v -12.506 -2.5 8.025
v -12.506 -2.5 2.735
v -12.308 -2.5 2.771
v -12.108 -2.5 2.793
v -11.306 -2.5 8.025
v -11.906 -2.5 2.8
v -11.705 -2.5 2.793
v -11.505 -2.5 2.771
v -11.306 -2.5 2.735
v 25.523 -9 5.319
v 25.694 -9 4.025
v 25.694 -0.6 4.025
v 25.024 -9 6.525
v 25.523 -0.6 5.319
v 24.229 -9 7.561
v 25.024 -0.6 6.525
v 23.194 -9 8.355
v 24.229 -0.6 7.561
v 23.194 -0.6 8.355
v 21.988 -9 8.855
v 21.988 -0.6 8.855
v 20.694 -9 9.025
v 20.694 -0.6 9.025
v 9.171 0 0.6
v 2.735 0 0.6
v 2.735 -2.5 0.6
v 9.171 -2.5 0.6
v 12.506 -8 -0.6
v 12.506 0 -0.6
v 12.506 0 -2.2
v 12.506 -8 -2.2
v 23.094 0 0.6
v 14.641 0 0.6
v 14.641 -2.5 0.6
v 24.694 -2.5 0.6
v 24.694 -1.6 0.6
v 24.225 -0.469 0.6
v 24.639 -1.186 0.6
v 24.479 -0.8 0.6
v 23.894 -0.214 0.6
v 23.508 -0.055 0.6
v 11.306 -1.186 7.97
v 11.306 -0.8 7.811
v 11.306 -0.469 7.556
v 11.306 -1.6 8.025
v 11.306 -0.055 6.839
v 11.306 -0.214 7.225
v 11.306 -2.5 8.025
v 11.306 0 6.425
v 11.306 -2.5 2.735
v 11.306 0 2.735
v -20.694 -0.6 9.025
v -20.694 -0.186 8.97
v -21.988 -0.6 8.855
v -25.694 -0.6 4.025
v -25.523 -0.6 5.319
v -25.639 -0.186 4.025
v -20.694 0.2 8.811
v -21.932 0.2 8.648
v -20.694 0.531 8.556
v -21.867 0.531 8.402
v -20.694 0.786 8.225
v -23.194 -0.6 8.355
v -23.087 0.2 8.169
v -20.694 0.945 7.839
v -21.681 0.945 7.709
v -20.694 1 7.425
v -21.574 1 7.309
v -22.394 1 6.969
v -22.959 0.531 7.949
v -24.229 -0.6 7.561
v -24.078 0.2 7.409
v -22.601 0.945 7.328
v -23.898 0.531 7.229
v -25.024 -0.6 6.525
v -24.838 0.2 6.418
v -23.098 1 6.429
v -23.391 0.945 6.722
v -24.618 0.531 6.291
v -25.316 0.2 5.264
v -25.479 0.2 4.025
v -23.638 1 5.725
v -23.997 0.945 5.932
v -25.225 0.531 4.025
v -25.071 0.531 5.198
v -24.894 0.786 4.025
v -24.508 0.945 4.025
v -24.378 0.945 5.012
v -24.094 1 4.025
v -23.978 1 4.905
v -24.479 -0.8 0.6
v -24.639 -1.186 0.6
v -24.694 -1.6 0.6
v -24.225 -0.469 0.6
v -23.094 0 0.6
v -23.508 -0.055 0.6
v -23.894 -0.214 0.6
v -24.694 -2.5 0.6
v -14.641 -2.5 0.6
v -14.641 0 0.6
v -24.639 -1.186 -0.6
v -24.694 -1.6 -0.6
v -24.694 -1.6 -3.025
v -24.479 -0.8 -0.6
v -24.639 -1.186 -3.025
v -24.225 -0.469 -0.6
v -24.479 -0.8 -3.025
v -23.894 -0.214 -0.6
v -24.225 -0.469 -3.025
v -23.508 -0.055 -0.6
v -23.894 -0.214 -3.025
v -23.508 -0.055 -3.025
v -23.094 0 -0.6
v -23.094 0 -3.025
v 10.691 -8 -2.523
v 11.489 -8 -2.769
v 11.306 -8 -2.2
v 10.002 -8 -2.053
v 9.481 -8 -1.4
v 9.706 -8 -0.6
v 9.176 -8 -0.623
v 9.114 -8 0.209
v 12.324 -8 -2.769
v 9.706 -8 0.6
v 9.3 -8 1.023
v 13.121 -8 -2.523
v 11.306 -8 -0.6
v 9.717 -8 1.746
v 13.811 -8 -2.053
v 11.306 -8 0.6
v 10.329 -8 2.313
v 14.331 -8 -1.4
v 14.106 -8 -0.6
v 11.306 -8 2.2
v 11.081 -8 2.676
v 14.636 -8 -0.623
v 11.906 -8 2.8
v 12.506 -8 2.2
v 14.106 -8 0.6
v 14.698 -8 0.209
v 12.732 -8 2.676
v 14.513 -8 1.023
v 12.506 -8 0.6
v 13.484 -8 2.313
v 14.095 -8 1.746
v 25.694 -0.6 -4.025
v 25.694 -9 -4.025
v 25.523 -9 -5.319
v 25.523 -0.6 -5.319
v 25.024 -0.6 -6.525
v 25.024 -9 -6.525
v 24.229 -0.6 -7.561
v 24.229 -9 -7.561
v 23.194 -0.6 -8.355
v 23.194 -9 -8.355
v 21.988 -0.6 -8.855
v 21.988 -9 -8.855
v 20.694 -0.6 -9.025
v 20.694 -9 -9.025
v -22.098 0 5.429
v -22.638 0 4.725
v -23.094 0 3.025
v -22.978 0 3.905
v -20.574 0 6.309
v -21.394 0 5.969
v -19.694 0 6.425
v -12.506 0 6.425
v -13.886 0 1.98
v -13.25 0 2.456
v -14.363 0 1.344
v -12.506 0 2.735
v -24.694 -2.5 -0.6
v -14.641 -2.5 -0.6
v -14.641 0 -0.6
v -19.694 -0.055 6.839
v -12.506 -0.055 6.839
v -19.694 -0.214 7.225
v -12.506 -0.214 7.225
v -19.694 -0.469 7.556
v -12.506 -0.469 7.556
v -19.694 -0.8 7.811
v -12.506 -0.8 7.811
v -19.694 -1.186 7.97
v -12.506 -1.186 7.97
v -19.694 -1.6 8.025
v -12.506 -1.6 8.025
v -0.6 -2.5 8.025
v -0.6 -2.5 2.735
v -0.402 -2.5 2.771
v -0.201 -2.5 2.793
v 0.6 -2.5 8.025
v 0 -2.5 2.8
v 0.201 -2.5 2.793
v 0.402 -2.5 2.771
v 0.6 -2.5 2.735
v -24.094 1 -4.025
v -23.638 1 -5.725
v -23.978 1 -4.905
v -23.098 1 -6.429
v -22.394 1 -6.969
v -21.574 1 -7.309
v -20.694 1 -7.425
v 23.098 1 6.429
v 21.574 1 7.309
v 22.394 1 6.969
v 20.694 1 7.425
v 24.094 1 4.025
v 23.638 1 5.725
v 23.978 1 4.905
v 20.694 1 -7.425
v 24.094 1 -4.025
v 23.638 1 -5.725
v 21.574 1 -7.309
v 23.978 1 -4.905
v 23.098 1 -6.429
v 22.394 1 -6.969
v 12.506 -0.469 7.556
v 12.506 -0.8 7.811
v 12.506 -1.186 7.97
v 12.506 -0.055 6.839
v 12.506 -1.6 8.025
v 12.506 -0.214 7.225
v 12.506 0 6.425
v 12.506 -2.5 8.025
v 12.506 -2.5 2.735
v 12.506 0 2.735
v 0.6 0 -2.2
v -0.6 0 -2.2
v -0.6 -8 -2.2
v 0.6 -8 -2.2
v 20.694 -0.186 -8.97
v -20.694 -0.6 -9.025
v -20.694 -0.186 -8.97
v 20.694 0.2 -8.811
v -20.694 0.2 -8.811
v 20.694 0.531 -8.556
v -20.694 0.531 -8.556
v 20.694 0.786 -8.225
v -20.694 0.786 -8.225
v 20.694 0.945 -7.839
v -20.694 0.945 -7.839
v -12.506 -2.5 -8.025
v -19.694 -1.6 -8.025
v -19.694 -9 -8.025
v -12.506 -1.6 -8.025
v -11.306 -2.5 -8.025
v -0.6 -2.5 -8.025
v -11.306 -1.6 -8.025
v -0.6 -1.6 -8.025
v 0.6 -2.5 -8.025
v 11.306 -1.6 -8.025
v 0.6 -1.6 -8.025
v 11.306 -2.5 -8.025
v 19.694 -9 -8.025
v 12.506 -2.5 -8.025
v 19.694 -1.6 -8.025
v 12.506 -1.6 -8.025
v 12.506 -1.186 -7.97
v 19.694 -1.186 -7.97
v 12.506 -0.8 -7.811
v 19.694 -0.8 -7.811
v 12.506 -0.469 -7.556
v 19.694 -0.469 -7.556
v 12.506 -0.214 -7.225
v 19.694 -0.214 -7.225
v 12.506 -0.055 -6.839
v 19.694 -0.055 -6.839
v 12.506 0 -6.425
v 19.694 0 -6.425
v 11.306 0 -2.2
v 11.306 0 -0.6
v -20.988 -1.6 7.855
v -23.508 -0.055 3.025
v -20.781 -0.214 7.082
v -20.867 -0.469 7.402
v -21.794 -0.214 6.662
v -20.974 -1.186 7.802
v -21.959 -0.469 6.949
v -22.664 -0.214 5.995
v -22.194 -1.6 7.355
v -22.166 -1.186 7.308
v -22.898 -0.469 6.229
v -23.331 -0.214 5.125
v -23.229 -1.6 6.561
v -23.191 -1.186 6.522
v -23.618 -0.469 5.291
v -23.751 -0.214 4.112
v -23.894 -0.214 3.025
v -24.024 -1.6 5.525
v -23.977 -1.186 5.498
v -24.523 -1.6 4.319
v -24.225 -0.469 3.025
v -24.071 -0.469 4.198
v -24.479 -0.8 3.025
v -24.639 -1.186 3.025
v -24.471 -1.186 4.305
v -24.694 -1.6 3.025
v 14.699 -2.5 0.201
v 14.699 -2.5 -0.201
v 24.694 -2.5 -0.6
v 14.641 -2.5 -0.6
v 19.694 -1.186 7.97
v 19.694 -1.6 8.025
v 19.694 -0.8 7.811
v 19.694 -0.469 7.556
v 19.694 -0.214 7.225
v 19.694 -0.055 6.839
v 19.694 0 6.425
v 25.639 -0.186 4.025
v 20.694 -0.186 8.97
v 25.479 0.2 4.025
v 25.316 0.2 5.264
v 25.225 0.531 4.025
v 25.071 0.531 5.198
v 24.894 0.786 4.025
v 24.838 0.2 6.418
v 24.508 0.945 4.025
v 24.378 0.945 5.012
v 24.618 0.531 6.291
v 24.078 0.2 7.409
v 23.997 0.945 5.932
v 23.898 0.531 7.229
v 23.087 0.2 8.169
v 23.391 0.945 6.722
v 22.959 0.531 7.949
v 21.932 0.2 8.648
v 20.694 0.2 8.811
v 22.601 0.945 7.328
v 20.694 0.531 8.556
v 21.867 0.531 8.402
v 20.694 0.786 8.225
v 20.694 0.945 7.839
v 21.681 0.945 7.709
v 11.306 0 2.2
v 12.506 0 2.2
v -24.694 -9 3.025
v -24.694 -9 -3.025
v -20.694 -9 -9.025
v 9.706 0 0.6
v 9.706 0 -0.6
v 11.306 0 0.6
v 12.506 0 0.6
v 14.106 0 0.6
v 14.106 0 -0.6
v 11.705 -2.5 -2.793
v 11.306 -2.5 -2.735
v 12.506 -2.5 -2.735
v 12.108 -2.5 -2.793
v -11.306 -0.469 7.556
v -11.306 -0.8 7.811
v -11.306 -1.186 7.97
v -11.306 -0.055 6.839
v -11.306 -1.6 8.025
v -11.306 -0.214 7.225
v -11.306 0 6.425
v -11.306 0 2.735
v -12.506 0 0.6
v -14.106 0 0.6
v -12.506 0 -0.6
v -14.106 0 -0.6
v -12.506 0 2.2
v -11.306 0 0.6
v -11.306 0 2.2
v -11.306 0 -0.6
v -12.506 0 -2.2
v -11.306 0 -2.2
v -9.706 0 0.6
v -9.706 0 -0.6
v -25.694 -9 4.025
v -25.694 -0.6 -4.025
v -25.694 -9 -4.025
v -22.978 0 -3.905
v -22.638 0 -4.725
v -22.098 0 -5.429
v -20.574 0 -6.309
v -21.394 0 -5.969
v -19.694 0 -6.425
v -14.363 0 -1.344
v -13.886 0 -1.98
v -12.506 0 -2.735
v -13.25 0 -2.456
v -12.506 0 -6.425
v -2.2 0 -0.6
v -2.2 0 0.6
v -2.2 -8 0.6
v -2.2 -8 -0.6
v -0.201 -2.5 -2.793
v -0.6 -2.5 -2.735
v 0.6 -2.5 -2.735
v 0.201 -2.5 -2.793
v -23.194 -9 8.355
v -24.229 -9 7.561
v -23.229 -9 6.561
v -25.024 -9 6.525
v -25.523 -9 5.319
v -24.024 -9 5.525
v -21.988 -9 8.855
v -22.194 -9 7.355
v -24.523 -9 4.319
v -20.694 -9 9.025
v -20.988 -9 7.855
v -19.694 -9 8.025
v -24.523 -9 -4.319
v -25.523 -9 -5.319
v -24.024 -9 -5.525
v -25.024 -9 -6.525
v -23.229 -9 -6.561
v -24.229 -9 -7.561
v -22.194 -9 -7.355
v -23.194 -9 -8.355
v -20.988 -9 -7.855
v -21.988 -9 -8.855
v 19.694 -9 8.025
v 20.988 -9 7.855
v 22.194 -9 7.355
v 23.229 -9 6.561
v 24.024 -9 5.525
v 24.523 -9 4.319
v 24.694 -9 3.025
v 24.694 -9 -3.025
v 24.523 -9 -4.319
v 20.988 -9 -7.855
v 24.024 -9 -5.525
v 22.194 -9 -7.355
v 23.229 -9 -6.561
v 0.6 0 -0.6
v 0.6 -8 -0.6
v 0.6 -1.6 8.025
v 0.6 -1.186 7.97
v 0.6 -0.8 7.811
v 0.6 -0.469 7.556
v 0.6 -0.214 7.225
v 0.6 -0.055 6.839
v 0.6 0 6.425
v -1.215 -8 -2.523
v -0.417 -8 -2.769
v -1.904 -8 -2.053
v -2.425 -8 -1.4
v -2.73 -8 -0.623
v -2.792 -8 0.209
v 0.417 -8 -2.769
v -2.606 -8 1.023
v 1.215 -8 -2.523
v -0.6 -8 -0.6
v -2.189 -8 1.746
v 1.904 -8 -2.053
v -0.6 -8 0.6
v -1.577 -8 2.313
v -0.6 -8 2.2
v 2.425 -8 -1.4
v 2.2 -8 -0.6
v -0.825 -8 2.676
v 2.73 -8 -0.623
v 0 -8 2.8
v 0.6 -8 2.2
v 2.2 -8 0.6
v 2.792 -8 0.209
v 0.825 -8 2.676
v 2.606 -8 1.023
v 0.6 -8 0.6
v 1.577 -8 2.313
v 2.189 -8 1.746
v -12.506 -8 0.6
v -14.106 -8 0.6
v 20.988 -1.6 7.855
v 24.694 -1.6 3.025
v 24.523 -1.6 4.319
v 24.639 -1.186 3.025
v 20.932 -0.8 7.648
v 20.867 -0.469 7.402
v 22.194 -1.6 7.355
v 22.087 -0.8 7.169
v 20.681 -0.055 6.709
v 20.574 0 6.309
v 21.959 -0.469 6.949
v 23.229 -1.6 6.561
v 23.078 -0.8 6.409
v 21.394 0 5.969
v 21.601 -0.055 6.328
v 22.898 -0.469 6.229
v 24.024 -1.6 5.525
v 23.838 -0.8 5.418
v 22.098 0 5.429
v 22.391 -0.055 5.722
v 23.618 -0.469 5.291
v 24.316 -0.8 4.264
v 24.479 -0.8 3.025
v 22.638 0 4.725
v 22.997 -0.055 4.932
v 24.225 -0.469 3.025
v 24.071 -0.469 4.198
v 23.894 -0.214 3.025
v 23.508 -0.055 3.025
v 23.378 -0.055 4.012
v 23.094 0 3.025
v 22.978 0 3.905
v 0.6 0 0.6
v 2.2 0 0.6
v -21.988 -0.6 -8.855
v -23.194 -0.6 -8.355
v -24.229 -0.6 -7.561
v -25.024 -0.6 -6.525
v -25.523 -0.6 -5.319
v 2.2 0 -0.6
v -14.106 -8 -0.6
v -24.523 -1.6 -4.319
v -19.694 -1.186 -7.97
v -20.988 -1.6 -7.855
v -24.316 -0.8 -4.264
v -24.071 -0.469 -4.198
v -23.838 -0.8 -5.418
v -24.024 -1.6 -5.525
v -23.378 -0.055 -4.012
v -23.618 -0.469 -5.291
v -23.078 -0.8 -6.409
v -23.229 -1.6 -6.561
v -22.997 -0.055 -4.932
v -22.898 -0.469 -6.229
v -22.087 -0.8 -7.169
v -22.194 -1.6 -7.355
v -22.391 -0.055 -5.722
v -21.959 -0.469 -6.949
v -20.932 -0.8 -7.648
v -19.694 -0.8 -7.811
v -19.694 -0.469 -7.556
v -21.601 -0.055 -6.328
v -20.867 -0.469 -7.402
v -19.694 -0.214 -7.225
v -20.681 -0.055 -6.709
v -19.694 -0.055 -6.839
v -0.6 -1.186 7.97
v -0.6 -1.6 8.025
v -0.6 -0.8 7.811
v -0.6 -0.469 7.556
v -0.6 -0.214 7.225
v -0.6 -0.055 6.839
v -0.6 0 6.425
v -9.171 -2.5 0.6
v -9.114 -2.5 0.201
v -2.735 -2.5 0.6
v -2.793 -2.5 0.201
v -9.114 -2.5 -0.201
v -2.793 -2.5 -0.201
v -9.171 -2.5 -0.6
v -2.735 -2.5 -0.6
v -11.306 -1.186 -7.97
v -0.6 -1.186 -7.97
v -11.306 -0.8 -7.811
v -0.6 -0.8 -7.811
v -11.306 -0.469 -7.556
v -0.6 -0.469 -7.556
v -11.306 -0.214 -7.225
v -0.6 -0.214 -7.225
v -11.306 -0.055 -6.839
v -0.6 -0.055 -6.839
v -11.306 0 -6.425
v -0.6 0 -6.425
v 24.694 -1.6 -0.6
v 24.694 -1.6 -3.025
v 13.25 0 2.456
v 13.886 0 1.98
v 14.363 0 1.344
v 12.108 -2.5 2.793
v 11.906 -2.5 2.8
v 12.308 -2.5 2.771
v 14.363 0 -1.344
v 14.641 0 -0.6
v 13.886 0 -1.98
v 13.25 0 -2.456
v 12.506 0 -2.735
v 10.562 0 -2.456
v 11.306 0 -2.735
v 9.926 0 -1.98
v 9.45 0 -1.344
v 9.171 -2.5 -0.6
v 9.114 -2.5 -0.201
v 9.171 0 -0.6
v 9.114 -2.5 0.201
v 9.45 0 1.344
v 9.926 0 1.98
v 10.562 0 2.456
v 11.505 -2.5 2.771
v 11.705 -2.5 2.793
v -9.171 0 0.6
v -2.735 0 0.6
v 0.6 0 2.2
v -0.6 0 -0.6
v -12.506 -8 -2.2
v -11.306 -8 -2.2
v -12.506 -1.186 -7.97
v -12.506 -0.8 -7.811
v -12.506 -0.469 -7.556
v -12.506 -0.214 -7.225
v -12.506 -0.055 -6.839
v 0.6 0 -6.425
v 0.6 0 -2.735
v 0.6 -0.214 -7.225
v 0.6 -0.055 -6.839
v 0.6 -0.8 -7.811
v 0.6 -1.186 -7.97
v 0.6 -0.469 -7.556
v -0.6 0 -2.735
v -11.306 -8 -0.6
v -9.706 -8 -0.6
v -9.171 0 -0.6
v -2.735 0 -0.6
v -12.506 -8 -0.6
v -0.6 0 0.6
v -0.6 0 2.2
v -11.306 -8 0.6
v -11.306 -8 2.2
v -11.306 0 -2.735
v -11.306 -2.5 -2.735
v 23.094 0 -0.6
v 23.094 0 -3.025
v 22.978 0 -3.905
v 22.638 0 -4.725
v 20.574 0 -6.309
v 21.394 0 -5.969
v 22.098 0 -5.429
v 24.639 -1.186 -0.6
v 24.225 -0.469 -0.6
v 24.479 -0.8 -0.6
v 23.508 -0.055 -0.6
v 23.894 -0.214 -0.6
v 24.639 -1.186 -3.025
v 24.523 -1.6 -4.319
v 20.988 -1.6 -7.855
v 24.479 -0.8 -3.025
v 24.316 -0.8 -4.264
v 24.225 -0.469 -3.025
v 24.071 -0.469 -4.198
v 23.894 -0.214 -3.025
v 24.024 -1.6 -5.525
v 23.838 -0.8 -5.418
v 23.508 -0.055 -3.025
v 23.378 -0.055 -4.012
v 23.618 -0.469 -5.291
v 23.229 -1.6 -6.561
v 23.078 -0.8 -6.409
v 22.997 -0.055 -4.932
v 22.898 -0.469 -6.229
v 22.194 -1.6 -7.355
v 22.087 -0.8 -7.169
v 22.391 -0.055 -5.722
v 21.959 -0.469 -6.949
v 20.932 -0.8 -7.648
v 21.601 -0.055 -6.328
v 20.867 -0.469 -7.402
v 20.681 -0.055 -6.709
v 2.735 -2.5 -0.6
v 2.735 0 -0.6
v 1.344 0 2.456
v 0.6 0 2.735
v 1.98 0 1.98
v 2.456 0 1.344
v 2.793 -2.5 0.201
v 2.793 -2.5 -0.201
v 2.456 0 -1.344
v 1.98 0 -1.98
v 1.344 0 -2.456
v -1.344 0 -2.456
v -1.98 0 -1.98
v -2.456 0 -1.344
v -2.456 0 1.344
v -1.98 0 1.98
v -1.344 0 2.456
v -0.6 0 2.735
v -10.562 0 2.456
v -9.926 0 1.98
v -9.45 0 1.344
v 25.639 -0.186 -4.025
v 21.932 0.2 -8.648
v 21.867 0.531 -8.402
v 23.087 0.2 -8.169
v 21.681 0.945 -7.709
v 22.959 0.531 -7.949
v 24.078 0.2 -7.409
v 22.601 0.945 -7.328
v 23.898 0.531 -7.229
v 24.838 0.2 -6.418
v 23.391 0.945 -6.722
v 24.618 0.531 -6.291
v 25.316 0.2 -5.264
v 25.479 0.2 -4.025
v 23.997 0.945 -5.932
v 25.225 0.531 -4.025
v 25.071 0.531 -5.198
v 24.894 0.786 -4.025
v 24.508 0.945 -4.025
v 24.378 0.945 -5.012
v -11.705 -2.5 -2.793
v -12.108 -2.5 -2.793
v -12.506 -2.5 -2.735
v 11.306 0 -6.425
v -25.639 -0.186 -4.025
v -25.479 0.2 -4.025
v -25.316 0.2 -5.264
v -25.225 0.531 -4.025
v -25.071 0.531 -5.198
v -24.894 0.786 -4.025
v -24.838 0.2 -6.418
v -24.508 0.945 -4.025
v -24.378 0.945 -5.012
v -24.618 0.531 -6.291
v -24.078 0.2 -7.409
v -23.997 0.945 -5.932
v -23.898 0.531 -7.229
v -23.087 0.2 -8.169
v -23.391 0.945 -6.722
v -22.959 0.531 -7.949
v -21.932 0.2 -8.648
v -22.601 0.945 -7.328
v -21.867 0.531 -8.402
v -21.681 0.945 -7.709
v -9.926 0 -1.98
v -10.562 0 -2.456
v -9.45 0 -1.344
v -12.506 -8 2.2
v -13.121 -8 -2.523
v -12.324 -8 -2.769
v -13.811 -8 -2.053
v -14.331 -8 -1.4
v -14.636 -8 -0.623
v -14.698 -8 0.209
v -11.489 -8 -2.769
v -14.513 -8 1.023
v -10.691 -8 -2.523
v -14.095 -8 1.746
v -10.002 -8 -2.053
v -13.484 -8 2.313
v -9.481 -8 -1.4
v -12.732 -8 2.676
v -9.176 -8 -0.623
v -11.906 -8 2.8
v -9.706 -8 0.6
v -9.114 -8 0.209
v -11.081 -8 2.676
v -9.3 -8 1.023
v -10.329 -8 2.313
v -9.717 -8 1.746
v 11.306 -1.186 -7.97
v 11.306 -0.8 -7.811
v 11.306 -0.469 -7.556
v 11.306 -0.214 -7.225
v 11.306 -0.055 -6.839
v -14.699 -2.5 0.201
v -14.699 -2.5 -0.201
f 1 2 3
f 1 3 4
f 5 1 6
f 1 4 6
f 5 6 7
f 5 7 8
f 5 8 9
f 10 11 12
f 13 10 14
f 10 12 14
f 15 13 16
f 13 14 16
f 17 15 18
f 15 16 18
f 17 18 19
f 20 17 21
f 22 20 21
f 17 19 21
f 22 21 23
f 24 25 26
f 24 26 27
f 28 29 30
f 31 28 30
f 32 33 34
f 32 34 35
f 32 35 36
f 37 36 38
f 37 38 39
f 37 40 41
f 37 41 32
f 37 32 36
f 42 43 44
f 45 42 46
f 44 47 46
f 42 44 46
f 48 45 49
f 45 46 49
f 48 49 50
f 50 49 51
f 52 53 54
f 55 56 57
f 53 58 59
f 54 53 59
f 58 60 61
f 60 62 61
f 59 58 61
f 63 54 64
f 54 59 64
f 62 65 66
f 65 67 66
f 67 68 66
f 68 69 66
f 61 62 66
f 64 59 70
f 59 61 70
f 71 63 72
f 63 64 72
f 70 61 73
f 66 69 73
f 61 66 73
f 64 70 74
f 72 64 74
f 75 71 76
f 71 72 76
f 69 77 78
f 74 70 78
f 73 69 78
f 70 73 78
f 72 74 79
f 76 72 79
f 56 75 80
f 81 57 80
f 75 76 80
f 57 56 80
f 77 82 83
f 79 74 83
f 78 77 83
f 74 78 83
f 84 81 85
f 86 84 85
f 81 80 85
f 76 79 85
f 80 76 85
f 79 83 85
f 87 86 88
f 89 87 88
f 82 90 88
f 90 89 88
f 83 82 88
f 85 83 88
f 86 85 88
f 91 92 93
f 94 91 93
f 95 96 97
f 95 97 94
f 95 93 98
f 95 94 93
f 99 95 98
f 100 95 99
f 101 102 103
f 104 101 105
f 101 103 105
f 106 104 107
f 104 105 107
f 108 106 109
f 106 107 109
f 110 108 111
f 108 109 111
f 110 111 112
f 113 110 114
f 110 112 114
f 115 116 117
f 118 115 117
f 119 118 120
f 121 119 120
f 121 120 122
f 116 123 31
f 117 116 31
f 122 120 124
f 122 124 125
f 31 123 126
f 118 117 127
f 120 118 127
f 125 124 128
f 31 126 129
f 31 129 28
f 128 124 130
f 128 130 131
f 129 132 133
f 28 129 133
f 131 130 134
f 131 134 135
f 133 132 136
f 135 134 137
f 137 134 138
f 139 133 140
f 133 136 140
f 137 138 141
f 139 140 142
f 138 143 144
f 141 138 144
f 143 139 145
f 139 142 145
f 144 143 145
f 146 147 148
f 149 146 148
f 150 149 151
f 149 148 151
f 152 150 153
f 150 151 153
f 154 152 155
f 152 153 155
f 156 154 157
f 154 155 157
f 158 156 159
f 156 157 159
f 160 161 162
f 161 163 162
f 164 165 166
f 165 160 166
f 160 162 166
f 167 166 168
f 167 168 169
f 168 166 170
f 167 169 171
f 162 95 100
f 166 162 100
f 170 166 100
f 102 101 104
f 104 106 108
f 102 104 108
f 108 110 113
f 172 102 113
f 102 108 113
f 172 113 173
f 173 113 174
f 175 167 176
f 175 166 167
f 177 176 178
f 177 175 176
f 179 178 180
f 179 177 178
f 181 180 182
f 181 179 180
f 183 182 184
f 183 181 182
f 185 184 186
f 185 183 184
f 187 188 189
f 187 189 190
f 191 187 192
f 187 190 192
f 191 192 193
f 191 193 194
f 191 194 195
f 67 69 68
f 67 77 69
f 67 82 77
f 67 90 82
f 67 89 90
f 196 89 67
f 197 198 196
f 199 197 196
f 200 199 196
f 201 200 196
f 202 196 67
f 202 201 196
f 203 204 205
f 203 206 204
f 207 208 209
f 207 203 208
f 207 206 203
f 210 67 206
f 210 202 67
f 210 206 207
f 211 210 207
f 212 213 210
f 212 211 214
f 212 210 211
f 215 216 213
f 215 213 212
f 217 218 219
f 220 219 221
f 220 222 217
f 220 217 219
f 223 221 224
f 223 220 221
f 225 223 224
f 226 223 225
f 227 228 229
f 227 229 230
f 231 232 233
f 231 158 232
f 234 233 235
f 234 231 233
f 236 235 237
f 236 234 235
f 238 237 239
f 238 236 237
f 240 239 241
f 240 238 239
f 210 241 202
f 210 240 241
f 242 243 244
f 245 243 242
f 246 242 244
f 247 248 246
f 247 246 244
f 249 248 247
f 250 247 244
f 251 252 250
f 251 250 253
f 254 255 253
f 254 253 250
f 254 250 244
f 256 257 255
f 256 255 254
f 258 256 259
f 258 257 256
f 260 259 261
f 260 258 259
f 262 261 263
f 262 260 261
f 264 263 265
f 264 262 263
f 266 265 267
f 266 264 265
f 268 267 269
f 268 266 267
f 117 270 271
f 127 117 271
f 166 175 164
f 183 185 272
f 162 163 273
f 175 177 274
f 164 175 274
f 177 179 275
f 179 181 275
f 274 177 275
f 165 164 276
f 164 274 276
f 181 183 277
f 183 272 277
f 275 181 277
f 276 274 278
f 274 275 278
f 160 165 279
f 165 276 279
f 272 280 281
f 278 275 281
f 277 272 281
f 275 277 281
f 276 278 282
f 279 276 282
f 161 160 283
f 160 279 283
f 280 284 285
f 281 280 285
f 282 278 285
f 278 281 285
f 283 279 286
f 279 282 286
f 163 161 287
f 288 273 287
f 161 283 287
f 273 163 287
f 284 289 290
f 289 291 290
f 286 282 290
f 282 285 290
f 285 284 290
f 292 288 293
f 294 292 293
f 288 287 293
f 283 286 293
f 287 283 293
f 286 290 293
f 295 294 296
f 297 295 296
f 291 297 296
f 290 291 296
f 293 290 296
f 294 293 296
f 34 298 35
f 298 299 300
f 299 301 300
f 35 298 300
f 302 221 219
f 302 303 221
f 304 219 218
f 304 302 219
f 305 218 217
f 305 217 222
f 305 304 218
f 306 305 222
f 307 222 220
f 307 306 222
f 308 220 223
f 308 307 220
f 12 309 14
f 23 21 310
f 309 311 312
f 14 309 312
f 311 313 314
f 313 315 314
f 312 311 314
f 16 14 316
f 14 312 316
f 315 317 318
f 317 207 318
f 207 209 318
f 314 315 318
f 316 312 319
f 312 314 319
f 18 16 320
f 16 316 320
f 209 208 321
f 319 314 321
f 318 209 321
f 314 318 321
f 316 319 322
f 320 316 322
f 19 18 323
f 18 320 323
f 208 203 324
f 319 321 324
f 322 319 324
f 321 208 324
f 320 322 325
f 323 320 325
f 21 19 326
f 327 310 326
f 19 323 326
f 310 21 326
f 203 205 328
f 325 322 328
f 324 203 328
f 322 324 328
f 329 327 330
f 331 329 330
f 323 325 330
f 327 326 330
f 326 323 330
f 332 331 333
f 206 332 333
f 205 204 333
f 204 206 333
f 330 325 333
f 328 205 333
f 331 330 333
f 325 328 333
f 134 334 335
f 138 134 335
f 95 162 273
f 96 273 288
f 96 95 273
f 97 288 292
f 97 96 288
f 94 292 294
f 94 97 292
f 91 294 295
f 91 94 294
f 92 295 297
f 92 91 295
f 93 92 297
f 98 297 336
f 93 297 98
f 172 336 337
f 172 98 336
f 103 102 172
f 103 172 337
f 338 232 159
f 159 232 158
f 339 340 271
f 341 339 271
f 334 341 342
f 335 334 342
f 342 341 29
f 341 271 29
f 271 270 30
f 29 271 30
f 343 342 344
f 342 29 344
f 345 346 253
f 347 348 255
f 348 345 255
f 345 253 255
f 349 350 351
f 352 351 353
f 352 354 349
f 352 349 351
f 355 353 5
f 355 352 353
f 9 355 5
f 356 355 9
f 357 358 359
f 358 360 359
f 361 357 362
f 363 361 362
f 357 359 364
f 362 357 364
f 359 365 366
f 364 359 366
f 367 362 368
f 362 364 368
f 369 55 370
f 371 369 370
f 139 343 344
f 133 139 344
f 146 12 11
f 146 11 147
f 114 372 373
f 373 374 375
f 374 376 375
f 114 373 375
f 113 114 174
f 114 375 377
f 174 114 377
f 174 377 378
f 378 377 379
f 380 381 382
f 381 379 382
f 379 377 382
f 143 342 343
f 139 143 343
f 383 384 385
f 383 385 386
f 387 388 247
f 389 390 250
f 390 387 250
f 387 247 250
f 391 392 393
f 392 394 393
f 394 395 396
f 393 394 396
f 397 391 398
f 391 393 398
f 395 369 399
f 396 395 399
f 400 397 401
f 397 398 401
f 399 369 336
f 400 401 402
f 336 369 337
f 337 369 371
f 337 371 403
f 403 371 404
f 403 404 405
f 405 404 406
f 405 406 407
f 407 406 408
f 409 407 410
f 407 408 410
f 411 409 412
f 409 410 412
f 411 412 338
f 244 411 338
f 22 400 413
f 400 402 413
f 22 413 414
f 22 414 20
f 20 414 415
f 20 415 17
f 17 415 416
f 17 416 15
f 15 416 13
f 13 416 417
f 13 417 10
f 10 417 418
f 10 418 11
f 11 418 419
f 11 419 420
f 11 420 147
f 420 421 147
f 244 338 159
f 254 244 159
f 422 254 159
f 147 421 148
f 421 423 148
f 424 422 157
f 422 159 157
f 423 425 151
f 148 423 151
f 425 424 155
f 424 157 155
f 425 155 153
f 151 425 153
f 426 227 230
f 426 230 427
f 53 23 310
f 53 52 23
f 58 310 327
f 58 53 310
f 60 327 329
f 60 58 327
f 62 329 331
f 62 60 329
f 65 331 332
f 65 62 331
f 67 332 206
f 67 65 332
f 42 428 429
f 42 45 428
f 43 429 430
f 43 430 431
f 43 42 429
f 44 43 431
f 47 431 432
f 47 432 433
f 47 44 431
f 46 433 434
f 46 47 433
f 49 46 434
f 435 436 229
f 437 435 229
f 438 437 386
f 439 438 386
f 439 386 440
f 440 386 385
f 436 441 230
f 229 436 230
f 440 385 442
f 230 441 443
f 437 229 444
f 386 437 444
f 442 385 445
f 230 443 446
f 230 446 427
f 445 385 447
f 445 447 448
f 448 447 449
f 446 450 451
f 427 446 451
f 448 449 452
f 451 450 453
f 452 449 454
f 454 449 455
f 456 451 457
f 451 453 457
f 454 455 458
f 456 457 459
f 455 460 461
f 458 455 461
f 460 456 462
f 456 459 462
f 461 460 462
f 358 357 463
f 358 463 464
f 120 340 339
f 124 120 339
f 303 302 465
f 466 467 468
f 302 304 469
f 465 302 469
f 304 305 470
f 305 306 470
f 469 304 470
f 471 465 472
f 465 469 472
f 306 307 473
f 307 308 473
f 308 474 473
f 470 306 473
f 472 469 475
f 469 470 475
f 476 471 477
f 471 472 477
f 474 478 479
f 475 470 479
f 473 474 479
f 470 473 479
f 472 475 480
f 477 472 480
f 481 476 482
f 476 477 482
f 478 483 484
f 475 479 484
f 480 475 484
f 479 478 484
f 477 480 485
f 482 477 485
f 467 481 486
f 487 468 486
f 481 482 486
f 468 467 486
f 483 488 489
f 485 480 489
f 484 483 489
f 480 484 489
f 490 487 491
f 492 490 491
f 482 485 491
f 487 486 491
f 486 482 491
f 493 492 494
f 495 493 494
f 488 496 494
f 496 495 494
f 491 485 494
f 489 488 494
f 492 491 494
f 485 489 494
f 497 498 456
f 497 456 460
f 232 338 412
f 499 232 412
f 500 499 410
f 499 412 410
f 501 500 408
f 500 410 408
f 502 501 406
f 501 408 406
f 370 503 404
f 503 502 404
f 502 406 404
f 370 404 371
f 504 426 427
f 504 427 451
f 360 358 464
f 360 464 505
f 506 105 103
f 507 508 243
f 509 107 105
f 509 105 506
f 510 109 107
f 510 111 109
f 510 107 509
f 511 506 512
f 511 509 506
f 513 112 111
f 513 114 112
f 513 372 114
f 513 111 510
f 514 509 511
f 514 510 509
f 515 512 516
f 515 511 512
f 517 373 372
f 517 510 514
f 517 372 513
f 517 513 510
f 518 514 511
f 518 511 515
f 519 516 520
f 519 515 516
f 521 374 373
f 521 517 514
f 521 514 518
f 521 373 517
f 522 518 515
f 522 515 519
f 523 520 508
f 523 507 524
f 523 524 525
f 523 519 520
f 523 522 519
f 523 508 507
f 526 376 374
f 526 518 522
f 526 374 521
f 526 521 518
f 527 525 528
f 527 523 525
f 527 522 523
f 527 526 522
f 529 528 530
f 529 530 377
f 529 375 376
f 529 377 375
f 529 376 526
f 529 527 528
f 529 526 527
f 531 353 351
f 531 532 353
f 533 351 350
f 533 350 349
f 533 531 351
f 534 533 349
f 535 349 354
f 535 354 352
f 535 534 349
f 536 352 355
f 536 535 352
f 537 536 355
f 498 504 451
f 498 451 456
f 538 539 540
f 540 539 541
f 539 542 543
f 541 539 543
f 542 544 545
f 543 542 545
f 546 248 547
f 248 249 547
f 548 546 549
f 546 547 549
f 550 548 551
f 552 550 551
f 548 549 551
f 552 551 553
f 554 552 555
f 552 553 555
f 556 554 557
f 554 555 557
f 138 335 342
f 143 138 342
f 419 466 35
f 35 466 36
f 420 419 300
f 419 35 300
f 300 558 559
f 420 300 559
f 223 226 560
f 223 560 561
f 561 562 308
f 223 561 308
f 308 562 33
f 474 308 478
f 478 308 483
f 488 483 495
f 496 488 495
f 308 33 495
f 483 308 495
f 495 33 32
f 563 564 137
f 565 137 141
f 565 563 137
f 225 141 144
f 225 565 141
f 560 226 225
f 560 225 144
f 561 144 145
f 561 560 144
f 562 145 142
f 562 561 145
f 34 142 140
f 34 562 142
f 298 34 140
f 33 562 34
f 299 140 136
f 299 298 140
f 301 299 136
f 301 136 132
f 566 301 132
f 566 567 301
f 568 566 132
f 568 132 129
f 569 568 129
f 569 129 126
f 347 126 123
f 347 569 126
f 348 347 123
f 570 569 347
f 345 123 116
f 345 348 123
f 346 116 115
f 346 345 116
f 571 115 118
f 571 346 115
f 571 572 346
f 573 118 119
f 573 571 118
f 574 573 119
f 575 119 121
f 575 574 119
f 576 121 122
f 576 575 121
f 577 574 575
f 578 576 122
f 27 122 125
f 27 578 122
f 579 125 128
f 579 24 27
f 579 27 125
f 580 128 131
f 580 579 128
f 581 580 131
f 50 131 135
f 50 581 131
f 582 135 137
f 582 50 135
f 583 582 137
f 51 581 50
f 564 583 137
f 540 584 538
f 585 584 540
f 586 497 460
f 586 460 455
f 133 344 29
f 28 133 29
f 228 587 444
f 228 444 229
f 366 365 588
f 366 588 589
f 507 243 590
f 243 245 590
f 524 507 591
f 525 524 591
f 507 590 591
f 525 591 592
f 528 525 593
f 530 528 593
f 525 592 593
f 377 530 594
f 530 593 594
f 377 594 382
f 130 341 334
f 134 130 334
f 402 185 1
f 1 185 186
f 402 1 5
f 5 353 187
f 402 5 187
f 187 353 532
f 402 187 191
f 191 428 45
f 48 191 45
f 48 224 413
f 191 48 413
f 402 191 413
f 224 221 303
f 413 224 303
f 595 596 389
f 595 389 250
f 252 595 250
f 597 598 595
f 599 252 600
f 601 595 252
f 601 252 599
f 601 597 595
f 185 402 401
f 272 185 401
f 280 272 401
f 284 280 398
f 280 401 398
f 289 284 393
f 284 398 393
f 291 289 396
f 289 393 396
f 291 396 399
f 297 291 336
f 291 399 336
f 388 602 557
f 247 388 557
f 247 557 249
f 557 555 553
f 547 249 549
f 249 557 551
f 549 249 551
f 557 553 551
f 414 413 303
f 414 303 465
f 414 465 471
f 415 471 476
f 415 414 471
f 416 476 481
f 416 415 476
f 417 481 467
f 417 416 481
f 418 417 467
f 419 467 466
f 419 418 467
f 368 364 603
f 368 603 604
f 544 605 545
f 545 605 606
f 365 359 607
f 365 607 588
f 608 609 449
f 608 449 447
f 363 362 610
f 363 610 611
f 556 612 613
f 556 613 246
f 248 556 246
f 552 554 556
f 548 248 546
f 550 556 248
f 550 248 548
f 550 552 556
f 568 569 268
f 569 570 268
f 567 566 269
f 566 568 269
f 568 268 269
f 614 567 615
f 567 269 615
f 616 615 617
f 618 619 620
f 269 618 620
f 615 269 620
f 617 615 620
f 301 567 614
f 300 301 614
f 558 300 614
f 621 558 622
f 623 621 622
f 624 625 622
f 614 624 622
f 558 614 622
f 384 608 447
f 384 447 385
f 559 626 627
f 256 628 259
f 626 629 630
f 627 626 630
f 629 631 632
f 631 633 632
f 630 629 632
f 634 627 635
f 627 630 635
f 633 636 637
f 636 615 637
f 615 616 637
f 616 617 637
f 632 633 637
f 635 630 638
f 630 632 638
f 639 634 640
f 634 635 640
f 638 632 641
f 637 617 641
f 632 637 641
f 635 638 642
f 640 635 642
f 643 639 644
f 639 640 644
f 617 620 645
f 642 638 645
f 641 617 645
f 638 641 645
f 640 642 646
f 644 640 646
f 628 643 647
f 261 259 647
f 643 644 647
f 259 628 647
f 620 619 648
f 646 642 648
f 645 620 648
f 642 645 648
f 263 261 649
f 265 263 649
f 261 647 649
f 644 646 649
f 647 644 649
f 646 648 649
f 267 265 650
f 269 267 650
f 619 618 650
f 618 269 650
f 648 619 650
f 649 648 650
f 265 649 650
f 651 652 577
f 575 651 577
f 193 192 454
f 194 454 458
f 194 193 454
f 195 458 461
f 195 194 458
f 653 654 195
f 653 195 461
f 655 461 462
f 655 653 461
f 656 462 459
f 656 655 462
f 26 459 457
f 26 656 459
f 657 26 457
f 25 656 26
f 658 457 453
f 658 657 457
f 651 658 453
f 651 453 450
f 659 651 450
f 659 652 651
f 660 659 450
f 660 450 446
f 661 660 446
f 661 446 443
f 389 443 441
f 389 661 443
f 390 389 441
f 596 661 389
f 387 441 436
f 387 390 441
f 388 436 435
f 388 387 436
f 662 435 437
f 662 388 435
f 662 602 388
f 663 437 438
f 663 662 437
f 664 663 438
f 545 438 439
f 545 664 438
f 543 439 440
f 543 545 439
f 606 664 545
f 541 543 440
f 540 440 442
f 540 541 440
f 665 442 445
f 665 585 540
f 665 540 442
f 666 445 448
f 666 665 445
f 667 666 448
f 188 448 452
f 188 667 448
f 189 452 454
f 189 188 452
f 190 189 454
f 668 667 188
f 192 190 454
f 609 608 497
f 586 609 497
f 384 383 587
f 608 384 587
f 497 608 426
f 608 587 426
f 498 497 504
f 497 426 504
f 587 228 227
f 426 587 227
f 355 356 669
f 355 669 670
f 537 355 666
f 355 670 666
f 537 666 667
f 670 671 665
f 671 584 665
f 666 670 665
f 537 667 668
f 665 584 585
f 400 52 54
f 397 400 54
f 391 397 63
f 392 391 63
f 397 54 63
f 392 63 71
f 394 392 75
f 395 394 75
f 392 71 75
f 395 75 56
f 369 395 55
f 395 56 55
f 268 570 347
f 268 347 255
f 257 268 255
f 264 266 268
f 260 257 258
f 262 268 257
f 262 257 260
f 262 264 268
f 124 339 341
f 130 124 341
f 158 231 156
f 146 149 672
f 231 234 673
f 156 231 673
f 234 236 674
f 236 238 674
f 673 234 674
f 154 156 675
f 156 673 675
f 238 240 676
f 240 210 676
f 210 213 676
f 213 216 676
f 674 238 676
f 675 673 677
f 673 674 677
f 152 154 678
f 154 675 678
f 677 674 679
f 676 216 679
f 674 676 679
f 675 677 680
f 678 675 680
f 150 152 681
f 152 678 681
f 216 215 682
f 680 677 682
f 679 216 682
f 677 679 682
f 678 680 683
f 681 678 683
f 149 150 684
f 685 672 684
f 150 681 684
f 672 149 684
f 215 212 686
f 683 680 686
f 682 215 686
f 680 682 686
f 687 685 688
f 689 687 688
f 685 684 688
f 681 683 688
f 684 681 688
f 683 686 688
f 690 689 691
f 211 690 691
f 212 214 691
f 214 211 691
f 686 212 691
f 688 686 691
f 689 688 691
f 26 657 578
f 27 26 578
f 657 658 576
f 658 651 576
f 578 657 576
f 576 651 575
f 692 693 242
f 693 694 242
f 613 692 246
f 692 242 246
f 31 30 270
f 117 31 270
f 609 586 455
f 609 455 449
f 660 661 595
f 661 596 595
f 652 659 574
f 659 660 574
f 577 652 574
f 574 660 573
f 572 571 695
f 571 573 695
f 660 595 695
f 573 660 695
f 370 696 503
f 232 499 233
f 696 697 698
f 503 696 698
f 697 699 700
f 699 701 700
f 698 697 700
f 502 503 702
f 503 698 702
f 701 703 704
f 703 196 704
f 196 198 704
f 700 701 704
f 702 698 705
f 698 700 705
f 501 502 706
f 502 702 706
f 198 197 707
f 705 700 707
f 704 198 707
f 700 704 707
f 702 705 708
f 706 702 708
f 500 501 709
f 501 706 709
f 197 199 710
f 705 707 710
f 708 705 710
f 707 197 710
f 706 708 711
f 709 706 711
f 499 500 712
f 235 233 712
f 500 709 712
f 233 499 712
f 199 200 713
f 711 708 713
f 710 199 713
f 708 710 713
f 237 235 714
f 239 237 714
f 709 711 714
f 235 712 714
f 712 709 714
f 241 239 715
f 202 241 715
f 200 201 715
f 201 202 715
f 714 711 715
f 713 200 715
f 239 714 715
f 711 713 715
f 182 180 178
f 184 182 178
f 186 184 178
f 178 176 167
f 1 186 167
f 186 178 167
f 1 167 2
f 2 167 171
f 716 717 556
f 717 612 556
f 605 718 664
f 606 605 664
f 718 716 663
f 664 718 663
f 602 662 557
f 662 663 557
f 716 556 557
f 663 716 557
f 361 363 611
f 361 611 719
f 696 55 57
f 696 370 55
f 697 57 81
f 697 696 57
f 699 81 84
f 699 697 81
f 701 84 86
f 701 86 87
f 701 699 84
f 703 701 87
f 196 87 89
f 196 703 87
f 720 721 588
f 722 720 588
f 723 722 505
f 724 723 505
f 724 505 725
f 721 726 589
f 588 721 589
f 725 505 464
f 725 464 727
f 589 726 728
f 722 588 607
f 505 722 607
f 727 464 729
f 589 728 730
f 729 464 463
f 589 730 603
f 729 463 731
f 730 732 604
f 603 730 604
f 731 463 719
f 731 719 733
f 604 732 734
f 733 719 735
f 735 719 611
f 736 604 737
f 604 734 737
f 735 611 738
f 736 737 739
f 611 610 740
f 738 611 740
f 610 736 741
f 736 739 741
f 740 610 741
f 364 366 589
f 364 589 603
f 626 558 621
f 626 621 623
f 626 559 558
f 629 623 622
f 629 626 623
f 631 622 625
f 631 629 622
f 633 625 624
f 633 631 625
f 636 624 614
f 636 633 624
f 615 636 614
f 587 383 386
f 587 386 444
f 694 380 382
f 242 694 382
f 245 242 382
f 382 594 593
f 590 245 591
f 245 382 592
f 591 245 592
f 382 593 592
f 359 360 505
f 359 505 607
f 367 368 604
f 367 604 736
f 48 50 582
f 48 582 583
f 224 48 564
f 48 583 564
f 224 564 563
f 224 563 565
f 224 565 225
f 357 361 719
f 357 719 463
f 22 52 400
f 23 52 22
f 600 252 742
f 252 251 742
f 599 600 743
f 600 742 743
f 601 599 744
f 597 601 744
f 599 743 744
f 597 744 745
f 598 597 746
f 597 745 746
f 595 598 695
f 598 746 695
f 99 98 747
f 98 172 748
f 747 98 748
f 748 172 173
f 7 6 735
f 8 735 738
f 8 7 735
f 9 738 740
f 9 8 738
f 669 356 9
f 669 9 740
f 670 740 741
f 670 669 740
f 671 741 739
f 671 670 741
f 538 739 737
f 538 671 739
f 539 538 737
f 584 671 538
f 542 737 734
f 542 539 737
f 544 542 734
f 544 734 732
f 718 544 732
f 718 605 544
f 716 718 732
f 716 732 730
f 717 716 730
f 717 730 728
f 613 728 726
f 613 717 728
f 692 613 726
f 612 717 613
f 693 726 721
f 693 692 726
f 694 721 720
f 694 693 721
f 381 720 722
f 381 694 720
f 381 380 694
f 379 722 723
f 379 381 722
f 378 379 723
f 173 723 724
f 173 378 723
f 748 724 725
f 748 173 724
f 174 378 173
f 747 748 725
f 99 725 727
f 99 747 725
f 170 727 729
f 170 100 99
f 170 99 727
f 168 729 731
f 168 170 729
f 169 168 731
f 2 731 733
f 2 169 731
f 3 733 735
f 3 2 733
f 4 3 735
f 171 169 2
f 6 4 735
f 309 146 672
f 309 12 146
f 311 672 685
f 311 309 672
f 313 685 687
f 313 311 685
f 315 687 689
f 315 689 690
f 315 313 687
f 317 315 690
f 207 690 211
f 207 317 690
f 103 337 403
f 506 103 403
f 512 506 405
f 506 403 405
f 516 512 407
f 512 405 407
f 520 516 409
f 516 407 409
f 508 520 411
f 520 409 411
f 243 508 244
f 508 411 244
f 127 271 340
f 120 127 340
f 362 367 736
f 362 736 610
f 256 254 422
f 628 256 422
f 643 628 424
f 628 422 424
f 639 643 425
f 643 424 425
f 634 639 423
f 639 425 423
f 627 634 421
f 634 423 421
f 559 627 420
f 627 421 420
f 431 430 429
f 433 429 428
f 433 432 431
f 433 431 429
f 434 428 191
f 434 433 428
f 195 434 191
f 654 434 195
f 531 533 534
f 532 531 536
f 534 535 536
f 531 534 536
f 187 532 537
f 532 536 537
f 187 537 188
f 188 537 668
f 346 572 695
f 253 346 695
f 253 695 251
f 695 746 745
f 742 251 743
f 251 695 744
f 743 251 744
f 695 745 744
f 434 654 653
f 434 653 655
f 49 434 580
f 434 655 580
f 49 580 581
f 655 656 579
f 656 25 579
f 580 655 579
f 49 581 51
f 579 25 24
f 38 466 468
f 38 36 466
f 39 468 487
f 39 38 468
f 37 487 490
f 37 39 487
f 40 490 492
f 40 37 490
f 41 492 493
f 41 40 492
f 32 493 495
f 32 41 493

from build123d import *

# Parameters (mm, degrees)
SKETCH_1_R        = 2.8
EXTRUDE_1_DEPTH   = 8
EXTRUDE_1_2_DEPTH = 8
EXTRUDE_1_3_DEPTH = 8
SKETCH_2_W        = 51.3875
SKETCH_2_H        = 18.05
EXTRUDE_2_DEPTH   = 1
SKETCH_3_W        = 51.3875
SKETCH_3_H        = 18.05
SKETCH_3_W_2      = 49.3875
SKETCH_3_H_2      = 16.05
EXTRUDE_3_DEPTH   = 9
SKETCH_4_W        = 7.50625
SKETCH_4_H        = 1.2
SKETCH_4_W_2      = 1.2
SKETCH_4_H_2      = 5.825
SKETCH_4_W_3      = 10.5875
EXTRUDE_4_DEPTH   = 2.5
FILLET_1_R        = 5
FILLET_2_R        = 1.6


with BuildPart() as part:
    # 草图1 → 凸台-拉伸1 (new body)
    with BuildSketch(Plane(origin=(0, 0, 0), x_dir=(1, 0, 0), z_dir=(0, 1, 0))):
        with Locations(Location((0, 0, 0), (0, 0, 270))):
            Circle(SKETCH_1_R)
        Polygon((2.2, 0.6), (2.2, -0.6), (0.6, -0.6), (0.6, -2.2), (-0.6, -2.2), (-0.6, -0.6), (-2.2, -0.6), (-2.2, 0.6), (-0.6, 0.6), (-0.6, 2.2), (0.6, 2.2), (0.6, 0.6), align=None, mode=Mode.SUBTRACT)
    extrude(amount=-EXTRUDE_1_DEPTH)

    # 草图2 → 凸台-拉伸2 (add)
    with BuildSketch(Plane(origin=(0, 0, 0), x_dir=(1, 0, 0), z_dir=(0, 1, 0))):
        Rectangle(SKETCH_2_W, SKETCH_2_H)
    extrude(amount=EXTRUDE_2_DEPTH)

    # 草图3 → 凸台-拉伸3 (add)
    with BuildSketch(Plane(origin=(0, 0, 0), x_dir=(1, 0, 0), z_dir=(0, 1, 0))):
        Rectangle(SKETCH_3_W, SKETCH_3_H)
        Rectangle(SKETCH_3_W_2, SKETCH_3_H_2, mode=Mode.SUBTRACT)
    extrude(amount=-EXTRUDE_3_DEPTH)



with BuildPart() as body_2:
    # 草图1 → Extrude 1 2 (new body)
    with BuildSketch(Plane(origin=(0, 0, 0), x_dir=(1, 0, 0), z_dir=(0, 1, 0))):
        with Locations(Location((-11.90625, 0, 0), (0, 0, 270))):
            Circle(SKETCH_1_R)
        Polygon((-14.10625, -0.6), (-14.10625, 0.6), (-12.50625, 0.6), (-12.50625, 2.2), (-11.30625, 2.2), (-11.30625, 0.6), (-9.70625, 0.6), (-9.70625, -0.6), (-11.30625, -0.6), (-11.30625, -2.2), (-12.50625, -2.2), (-12.50625, -0.6), align=None, mode=Mode.SUBTRACT)
    extrude(amount=-EXTRUDE_1_2_DEPTH)


with BuildPart() as body_3:
    # 草图1 → Extrude 1 3 (new body)
    with BuildSketch(Plane(origin=(0, 0, 0), x_dir=(1, 0, 0), z_dir=(0, 1, 0))):
        with Locations(Location((11.90625, 0, 0), (0, 0, 270))):
            Circle(SKETCH_1_R)
        Polygon((9.70625, 0.6), (9.70625, -0.6), (11.30625, -0.6), (11.30625, -2.2), (12.50625, -2.2), (12.50625, -0.6), (14.10625, -0.6), (14.10625, 0.6), (12.50625, 0.6), (12.50625, 2.2), (11.30625, 2.2), (11.30625, 0.6), align=None, mode=Mode.SUBTRACT)
    extrude(amount=-EXTRUDE_1_3_DEPTH)


with BuildPart() as part_1:
    add(part.part)

    add(body_2.part)  # 凸台-拉伸4 merges body 2

    add(body_3.part)  # 凸台-拉伸4 merges body 3
    # 草图4 → 凸台-拉伸4 (add)
    with BuildSketch(Plane(origin=(0, 0, 0), x_dir=(1, 0, 0), z_dir=(0, 1, 0))):
        with Locations((5.953125, 0)):
            Rectangle(SKETCH_4_W, SKETCH_4_H)
        with Locations((11.90625, 5.1125)):
            Rectangle(SKETCH_4_W_2, SKETCH_4_H_2)
        with Locations((11.90625, -5.1125)):
            Rectangle(SKETCH_4_W_2, SKETCH_4_H_2)
        with Locations((19.4, 0)):
            Rectangle(SKETCH_4_W_3, SKETCH_4_H)
        with Locations((0, 5.1125)):
            Rectangle(SKETCH_4_W_2, SKETCH_4_H_2)
        with Locations((-5.953125, 0)):
            Rectangle(SKETCH_4_W, SKETCH_4_H)
        with Locations((0, -5.1125)):
            Rectangle(SKETCH_4_W_2, SKETCH_4_H_2)
        with Locations((-11.90625, 5.1125)):
            Rectangle(SKETCH_4_W_2, SKETCH_4_H_2)
        with Locations((-11.90625, -5.1125)):
            Rectangle(SKETCH_4_W_2, SKETCH_4_H_2)
        with Locations((-19.4, 0)):
            Rectangle(SKETCH_4_W_3, SKETCH_4_H)
    extrude(amount=-EXTRUDE_4_DEPTH)

    # 圆角1
    fillet_1_edges = [part_1.edges().sort_by_distance(p)[0] for p in [
        (25.69375, -4, 9.025),
        (25.69375, -4, -9.025),
        (-25.69375, -4, -9.025),
        (-25.69375, -4, 9.025),
        (-24.69375, -4.5, 8.025),
        (-24.69375, -4.5, -8.025),
        (24.69375, -4.5, -8.025),
        (24.69375, -4.5, 8.025),
    ]]
    fillet(fillet_1_edges, radius=FILLET_1_R)

    # 圆角2
    fillet_2_edges = [part_1.edges().sort_by_distance(p)[0] for p in [
        (5.953125, 0, -8.025),
        (16.1, 0, 8.025),
        (24.69375, 0, -1.8125),
        (-5.953125, 0, -8.025),
        (5.953125, 0, 8.025),
        (-16.1, 0, -8.025),
        (-5.953125, 0, 8.025),
        (-24.69375, 0, 1.8125),
        (-25.69375, 1, 0),
        (0, 1, -9.025),
        (25.69375, 1, 0),
        (0, 1, 9.025),
        (-24.229283906, 1, 7.560533906),
        (24.229283906, 1, 7.560533906),
        (24.229283906, 1, -7.560533906),
        (-24.229283906, 1, -7.560533906),
        (-24.69375, 0, -1.8125),
        (-23.229283906, 0, -6.560533906),
        (16.1, 0, -8.025),
        (23.229283906, 0, -6.560533906),
        (24.69375, 0, 1.8125),
        (23.229283906, 0, 6.560533906),
        (-16.1, 0, 8.025),
        (-23.229283906, 0, 6.560533906),
    ]]
    fillet(fillet_2_edges, radius=FILLET_2_R)


solid = part_1.part
